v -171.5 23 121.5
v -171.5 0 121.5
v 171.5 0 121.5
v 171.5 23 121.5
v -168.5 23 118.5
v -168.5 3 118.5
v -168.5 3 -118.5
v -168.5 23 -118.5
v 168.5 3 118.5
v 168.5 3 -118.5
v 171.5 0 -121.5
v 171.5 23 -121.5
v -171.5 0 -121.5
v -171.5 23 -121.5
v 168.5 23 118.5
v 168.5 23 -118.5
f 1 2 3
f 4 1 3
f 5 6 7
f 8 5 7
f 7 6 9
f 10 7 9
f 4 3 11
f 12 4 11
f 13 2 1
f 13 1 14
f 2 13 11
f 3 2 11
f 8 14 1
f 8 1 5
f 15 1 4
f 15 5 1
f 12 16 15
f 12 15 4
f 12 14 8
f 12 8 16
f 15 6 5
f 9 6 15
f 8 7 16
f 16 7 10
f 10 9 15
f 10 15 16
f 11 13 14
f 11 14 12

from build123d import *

# Parameters (mm, degrees)
SKETCH1_W           = 343
SKETCH1_H           = 243
SKETCH1_W_2         = 337
SKETCH1_H_2         = 237
BOSS_EXTRUDE1_DEPTH = 23
SKETCH2_W           = 343
SKETCH2_H           = 243
BOSS_EXTRUDE2_DEPTH = 3


with BuildPart() as part:
    # Sketch1 → Boss-Extrude1 (new body)
    with BuildSketch(Plane(origin=(0, 0, 0), x_dir=(1, 0, 0), z_dir=(0, 1, 0))):
        Rectangle(SKETCH1_W, SKETCH1_H)
        Rectangle(SKETCH1_W_2, SKETCH1_H_2, mode=Mode.SUBTRACT)
    extrude(amount=BOSS_EXTRUDE1_DEPTH)

    # Sketch2 → Boss-Extrude2 (add)
    with BuildSketch(Plane.XZ):
        Rectangle(SKETCH2_W, SKETCH2_H)
    extrude(amount=-BOSS_EXTRUDE2_DEPTH)


solid = part.part
